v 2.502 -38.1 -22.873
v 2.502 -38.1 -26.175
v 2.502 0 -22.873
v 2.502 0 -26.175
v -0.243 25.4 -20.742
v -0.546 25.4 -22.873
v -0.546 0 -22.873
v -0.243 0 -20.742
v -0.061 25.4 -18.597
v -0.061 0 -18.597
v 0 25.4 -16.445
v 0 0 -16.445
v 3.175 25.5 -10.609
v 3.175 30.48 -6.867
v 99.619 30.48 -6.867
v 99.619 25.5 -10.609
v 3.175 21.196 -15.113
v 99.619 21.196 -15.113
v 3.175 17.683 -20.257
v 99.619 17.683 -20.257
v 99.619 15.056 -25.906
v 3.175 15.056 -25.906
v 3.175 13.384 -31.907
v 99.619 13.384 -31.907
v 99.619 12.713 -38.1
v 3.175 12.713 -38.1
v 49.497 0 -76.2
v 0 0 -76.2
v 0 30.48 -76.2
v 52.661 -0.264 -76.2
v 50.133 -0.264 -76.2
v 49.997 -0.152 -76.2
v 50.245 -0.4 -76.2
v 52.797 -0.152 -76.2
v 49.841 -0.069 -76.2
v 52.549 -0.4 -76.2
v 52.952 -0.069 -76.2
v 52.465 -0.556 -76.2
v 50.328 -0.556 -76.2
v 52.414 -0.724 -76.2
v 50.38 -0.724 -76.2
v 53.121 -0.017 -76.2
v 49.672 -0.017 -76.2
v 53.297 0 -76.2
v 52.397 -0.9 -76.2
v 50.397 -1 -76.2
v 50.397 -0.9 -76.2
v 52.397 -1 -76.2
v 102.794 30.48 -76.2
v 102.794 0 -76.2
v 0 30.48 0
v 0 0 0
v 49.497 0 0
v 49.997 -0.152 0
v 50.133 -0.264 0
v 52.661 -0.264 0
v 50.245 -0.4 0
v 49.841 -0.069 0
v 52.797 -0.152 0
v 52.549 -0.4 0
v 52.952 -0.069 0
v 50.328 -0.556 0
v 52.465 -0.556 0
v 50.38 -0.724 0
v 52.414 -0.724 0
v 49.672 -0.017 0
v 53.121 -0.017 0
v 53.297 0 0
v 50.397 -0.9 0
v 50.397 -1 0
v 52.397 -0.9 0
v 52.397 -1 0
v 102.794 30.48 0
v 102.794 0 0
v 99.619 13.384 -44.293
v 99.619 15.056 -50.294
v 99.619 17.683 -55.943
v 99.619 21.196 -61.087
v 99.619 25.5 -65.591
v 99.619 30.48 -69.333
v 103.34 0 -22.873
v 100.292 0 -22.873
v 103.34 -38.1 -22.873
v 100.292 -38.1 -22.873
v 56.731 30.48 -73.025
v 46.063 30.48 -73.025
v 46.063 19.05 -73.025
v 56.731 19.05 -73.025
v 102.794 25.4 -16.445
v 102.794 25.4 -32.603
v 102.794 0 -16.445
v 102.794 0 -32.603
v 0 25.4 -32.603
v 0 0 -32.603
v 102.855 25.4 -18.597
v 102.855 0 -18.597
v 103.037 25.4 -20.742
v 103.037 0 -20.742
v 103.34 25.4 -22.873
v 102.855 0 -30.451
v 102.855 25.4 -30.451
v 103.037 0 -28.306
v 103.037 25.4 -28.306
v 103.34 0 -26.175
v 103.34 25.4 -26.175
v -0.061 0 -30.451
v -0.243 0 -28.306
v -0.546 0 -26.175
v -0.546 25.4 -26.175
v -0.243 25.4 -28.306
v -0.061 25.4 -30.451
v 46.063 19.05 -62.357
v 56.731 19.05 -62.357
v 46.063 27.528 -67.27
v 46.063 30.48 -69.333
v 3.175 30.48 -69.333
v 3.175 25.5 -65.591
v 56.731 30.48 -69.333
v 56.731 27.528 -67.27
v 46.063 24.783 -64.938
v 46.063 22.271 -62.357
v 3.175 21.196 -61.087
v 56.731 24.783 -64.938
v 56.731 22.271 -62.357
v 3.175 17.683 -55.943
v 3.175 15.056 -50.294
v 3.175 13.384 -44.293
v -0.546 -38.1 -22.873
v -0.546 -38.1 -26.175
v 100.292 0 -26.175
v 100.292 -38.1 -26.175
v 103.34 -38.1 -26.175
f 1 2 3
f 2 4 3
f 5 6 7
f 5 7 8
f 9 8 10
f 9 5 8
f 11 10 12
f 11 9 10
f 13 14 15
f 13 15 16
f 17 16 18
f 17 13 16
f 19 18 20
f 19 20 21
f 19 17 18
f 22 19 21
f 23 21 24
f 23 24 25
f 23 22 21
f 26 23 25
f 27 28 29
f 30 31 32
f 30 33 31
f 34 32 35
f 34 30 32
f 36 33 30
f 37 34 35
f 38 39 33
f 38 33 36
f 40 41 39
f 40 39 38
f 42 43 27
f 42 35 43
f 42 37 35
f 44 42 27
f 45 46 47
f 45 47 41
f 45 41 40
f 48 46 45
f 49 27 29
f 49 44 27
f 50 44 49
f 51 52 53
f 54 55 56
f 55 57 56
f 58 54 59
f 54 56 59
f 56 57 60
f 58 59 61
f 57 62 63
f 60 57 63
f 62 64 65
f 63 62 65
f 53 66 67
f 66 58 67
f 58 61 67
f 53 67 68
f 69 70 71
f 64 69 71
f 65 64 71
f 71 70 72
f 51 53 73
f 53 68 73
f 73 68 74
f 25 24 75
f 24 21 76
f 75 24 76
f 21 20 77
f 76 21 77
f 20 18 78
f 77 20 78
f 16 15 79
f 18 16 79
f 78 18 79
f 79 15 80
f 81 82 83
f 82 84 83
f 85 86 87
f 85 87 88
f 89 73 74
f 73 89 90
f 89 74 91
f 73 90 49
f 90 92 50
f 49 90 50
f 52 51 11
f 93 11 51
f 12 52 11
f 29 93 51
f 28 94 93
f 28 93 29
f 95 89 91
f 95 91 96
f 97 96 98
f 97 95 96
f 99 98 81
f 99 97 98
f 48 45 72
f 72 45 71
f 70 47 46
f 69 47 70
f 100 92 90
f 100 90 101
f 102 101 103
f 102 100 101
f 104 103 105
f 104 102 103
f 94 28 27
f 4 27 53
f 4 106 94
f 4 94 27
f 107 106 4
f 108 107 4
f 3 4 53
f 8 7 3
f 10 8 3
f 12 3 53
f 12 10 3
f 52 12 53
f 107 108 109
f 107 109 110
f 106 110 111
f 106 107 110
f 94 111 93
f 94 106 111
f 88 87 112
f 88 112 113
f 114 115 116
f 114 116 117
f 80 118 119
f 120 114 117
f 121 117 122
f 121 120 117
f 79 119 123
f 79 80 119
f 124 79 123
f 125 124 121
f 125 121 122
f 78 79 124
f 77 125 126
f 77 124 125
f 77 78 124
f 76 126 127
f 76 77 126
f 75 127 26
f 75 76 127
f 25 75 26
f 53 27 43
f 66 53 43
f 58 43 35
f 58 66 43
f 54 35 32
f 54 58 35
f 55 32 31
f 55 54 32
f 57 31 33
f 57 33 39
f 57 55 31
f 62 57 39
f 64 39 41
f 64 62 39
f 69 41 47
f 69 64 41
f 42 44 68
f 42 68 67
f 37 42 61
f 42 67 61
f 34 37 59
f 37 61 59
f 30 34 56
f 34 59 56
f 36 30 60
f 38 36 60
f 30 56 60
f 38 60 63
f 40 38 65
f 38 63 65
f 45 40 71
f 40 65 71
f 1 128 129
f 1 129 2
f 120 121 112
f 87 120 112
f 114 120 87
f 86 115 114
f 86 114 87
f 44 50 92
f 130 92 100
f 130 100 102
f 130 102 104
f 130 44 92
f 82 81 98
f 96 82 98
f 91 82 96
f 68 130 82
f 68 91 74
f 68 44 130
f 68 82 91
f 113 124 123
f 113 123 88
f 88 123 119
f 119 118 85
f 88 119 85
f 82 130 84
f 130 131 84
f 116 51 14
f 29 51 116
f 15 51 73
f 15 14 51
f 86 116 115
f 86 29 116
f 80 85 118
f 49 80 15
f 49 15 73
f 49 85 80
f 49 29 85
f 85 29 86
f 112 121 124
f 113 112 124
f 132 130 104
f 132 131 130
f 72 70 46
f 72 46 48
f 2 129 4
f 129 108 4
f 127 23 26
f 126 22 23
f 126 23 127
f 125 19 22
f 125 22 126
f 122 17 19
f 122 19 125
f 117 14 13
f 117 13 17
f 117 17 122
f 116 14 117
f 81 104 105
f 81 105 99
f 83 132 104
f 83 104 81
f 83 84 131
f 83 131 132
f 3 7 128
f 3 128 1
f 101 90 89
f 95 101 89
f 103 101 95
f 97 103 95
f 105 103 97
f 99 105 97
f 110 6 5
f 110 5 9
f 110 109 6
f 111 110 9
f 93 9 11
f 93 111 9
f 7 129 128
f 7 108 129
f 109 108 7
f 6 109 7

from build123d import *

# Parameters (mm, degrees)
SKETCH1_W           = 102.7938
SKETCH1_H           = 76.2
BOSS_EXTRUDE1_DEPTH = 38.1
SKETCH2_W           = 96.4438
SKETCH2_H           = 69.85
CUT_EXTRUDE1_DEPTH  = 25.4
SKETCH3_W           = 3.048
SKETCH3_H           = 3.302
BOSS_EXTRUDE2_DEPTH = 25.4
FILLET1_R           = 38.1
SKETCH8_W           = 10.668
SKETCH8_H           = 10.668
CUT_EXTRUDE3_DEPTH  = 19.05
SKETCH7_W           = 102.7938
SKETCH7_H           = 76.2
CUT_EXTRUDE4_DEPTH  = 7.62
FILLET2_R           = 38.1
SKETCH9_W           = 3.048
SKETCH9_H           = 3.302
BOSS_EXTRUDE3_DEPTH = 12.7
SKETCH10_W          = 2
SKETCH10_H          = 76.2
BOSS_EXTRUDE4_DEPTH = 1
FILLET3_R           = 0.9


with BuildPart() as part:
    # Sketch1 → Boss-Extrude1 (new body)
    with BuildSketch(Plane(origin=(0, 0, 0), x_dir=(1, 0, 0), z_dir=(0, 1, 0))):
        with Locations((51.3969, 38.1)):
            Rectangle(SKETCH1_W, SKETCH1_H)
    extrude(amount=BOSS_EXTRUDE1_DEPTH)

    # Sketch2 → Cut-Extrude1 (cut)
    with BuildSketch(Plane(origin=(0, 38.1, 0), x_dir=(1, 0, 0), z_dir=(0, 1, 0))):
        with Locations((51.3969, 38.1)):
            Rectangle(SKETCH2_W, SKETCH2_H)
    extrude(amount=-CUT_EXTRUDE1_DEPTH, mode=Mode.SUBTRACT)

    # Sketch3 → Boss-Extrude2 (add, symmetric)
    with BuildSketch(Plane.XZ):
        with Locations((0.9779, -24.524)):
            Rectangle(SKETCH3_W, SKETCH3_H)
        with Locations((101.8159, -24.524)):
            Rectangle(SKETCH3_W, SKETCH3_H)
    extrude(amount=BOSS_EXTRUDE2_DEPTH, both=True)

    # Fillet1
    # the kernel refuses this fillet: 38.1 mm, written as the material it adds along each edge
    with BuildSketch(Plane(origin=(3.175, 12.7, -3.175), x_dir=(0, 1, 0), z_dir=(1, 0, 0)), Plane(origin=(99.6188, 12.7, -73.025), x_dir=(0, 1, 0), z_dir=(-1, 0, 0))) as fillet1_piece_1:
        with BuildLine():
            CenterArc((38.1, -35.921024484), FILLET1_R, 109.471220634, 70.528779366)
            Line((0, -35.921024484), (-0.762, -35.921024484))
            Line((-0.762, -35.921024484), (-0.762, 0))
            Line((-0.762, 0), (0, 0.762))
            ThreePointArc((0, 0.762), (12.7, 0.762), (25.146, 0.71842049))
            Line((25.146, 0.71842049), (25.4, 0))
        make_face()
    extrude(amount=96.4438)

    # Sketch8 → Cut-Extrude3 (cut)
    with BuildSketch(Plane(origin=(0, 38.1, 0), x_dir=(1, 0, 0), z_dir=(0, 1, 0))):
        with Locations((51.3969, 67.691)):
            Rectangle(SKETCH8_W, SKETCH8_H)
    extrude(amount=-CUT_EXTRUDE3_DEPTH, mode=Mode.SUBTRACT)

    # Sketch7 → Cut-Extrude4 (cut)
    with BuildSketch(Plane(origin=(0, 38.1, 0), x_dir=(1, 0, 0), z_dir=(0, 1, 0))):
        with Locations((51.3969, 38.1)):
            Rectangle(SKETCH7_W, SKETCH7_H)
    extrude(amount=-CUT_EXTRUDE4_DEPTH, mode=Mode.SUBTRACT)

    # Fillet2
    # the kernel refuses this fillet: 38.1 mm, written as the material it adds along each edge
    with BuildSketch(Plane(origin=(0, 25.4, -22.873), x_dir=(0, 0, 1), z_dir=(0, -1, 0)), Plane(origin=(0, 0, -26.175), x_dir=(0, 0, -1), z_dir=(0, 1, 0))) as fillet2_piece_1:
        with BuildLine():
            CenterArc((6.42764302, 38.1), FILLET2_R, 260.287493111, 9.712506889)
            Line((0, 0.5461), (0, 0))
            Line((0, 0), (6.42764302, 0))
        make_face()
    extrude(amount=25.4)
    with BuildSketch(Plane(origin=(102.7938, 0, -26.175), x_dir=(0, 0, -1), z_dir=(0, 1, 0)), Plane(origin=(102.7938, 25.4, -22.873), x_dir=(0, 0, 1), z_dir=(0, -1, 0))) as fillet2_piece_2:
        with BuildLine():
            CenterArc((6.42764302, -38.1), FILLET2_R, 90, 9.712506889)
            Line((0, -0.5461), (0, 0))
            Line((0, 0), (6.42764302, 0))
        make_face()
    extrude(amount=25.4)

    # Sketch9 → Boss-Extrude3 (add)
    with BuildSketch(Plane.XZ.offset(25.4)):
        with Locations((0.9779, -24.524)):
            Rectangle(SKETCH9_W, SKETCH9_H)
        with Locations((101.8159, -24.524)):
            Rectangle(SKETCH9_W, SKETCH9_H)
    extrude(amount=BOSS_EXTRUDE3_DEPTH)

    # Sketch10 → Boss-Extrude4 (add)
    with BuildSketch(Plane.XZ):
        with Locations((51.3969, -38.1)):
            Rectangle(SKETCH10_W, SKETCH10_H)
    extrude(amount=BOSS_EXTRUDE4_DEPTH)

    # Fillet3
    fillet3_edges = [part.edges().sort_by_distance(p)[0] for p in [
        (50.3969, 0, -38.1),
        (52.3969, 0, -38.1),
    ]]
    fillet(fillet3_edges, radius=FILLET3_R)


solid = part.part
